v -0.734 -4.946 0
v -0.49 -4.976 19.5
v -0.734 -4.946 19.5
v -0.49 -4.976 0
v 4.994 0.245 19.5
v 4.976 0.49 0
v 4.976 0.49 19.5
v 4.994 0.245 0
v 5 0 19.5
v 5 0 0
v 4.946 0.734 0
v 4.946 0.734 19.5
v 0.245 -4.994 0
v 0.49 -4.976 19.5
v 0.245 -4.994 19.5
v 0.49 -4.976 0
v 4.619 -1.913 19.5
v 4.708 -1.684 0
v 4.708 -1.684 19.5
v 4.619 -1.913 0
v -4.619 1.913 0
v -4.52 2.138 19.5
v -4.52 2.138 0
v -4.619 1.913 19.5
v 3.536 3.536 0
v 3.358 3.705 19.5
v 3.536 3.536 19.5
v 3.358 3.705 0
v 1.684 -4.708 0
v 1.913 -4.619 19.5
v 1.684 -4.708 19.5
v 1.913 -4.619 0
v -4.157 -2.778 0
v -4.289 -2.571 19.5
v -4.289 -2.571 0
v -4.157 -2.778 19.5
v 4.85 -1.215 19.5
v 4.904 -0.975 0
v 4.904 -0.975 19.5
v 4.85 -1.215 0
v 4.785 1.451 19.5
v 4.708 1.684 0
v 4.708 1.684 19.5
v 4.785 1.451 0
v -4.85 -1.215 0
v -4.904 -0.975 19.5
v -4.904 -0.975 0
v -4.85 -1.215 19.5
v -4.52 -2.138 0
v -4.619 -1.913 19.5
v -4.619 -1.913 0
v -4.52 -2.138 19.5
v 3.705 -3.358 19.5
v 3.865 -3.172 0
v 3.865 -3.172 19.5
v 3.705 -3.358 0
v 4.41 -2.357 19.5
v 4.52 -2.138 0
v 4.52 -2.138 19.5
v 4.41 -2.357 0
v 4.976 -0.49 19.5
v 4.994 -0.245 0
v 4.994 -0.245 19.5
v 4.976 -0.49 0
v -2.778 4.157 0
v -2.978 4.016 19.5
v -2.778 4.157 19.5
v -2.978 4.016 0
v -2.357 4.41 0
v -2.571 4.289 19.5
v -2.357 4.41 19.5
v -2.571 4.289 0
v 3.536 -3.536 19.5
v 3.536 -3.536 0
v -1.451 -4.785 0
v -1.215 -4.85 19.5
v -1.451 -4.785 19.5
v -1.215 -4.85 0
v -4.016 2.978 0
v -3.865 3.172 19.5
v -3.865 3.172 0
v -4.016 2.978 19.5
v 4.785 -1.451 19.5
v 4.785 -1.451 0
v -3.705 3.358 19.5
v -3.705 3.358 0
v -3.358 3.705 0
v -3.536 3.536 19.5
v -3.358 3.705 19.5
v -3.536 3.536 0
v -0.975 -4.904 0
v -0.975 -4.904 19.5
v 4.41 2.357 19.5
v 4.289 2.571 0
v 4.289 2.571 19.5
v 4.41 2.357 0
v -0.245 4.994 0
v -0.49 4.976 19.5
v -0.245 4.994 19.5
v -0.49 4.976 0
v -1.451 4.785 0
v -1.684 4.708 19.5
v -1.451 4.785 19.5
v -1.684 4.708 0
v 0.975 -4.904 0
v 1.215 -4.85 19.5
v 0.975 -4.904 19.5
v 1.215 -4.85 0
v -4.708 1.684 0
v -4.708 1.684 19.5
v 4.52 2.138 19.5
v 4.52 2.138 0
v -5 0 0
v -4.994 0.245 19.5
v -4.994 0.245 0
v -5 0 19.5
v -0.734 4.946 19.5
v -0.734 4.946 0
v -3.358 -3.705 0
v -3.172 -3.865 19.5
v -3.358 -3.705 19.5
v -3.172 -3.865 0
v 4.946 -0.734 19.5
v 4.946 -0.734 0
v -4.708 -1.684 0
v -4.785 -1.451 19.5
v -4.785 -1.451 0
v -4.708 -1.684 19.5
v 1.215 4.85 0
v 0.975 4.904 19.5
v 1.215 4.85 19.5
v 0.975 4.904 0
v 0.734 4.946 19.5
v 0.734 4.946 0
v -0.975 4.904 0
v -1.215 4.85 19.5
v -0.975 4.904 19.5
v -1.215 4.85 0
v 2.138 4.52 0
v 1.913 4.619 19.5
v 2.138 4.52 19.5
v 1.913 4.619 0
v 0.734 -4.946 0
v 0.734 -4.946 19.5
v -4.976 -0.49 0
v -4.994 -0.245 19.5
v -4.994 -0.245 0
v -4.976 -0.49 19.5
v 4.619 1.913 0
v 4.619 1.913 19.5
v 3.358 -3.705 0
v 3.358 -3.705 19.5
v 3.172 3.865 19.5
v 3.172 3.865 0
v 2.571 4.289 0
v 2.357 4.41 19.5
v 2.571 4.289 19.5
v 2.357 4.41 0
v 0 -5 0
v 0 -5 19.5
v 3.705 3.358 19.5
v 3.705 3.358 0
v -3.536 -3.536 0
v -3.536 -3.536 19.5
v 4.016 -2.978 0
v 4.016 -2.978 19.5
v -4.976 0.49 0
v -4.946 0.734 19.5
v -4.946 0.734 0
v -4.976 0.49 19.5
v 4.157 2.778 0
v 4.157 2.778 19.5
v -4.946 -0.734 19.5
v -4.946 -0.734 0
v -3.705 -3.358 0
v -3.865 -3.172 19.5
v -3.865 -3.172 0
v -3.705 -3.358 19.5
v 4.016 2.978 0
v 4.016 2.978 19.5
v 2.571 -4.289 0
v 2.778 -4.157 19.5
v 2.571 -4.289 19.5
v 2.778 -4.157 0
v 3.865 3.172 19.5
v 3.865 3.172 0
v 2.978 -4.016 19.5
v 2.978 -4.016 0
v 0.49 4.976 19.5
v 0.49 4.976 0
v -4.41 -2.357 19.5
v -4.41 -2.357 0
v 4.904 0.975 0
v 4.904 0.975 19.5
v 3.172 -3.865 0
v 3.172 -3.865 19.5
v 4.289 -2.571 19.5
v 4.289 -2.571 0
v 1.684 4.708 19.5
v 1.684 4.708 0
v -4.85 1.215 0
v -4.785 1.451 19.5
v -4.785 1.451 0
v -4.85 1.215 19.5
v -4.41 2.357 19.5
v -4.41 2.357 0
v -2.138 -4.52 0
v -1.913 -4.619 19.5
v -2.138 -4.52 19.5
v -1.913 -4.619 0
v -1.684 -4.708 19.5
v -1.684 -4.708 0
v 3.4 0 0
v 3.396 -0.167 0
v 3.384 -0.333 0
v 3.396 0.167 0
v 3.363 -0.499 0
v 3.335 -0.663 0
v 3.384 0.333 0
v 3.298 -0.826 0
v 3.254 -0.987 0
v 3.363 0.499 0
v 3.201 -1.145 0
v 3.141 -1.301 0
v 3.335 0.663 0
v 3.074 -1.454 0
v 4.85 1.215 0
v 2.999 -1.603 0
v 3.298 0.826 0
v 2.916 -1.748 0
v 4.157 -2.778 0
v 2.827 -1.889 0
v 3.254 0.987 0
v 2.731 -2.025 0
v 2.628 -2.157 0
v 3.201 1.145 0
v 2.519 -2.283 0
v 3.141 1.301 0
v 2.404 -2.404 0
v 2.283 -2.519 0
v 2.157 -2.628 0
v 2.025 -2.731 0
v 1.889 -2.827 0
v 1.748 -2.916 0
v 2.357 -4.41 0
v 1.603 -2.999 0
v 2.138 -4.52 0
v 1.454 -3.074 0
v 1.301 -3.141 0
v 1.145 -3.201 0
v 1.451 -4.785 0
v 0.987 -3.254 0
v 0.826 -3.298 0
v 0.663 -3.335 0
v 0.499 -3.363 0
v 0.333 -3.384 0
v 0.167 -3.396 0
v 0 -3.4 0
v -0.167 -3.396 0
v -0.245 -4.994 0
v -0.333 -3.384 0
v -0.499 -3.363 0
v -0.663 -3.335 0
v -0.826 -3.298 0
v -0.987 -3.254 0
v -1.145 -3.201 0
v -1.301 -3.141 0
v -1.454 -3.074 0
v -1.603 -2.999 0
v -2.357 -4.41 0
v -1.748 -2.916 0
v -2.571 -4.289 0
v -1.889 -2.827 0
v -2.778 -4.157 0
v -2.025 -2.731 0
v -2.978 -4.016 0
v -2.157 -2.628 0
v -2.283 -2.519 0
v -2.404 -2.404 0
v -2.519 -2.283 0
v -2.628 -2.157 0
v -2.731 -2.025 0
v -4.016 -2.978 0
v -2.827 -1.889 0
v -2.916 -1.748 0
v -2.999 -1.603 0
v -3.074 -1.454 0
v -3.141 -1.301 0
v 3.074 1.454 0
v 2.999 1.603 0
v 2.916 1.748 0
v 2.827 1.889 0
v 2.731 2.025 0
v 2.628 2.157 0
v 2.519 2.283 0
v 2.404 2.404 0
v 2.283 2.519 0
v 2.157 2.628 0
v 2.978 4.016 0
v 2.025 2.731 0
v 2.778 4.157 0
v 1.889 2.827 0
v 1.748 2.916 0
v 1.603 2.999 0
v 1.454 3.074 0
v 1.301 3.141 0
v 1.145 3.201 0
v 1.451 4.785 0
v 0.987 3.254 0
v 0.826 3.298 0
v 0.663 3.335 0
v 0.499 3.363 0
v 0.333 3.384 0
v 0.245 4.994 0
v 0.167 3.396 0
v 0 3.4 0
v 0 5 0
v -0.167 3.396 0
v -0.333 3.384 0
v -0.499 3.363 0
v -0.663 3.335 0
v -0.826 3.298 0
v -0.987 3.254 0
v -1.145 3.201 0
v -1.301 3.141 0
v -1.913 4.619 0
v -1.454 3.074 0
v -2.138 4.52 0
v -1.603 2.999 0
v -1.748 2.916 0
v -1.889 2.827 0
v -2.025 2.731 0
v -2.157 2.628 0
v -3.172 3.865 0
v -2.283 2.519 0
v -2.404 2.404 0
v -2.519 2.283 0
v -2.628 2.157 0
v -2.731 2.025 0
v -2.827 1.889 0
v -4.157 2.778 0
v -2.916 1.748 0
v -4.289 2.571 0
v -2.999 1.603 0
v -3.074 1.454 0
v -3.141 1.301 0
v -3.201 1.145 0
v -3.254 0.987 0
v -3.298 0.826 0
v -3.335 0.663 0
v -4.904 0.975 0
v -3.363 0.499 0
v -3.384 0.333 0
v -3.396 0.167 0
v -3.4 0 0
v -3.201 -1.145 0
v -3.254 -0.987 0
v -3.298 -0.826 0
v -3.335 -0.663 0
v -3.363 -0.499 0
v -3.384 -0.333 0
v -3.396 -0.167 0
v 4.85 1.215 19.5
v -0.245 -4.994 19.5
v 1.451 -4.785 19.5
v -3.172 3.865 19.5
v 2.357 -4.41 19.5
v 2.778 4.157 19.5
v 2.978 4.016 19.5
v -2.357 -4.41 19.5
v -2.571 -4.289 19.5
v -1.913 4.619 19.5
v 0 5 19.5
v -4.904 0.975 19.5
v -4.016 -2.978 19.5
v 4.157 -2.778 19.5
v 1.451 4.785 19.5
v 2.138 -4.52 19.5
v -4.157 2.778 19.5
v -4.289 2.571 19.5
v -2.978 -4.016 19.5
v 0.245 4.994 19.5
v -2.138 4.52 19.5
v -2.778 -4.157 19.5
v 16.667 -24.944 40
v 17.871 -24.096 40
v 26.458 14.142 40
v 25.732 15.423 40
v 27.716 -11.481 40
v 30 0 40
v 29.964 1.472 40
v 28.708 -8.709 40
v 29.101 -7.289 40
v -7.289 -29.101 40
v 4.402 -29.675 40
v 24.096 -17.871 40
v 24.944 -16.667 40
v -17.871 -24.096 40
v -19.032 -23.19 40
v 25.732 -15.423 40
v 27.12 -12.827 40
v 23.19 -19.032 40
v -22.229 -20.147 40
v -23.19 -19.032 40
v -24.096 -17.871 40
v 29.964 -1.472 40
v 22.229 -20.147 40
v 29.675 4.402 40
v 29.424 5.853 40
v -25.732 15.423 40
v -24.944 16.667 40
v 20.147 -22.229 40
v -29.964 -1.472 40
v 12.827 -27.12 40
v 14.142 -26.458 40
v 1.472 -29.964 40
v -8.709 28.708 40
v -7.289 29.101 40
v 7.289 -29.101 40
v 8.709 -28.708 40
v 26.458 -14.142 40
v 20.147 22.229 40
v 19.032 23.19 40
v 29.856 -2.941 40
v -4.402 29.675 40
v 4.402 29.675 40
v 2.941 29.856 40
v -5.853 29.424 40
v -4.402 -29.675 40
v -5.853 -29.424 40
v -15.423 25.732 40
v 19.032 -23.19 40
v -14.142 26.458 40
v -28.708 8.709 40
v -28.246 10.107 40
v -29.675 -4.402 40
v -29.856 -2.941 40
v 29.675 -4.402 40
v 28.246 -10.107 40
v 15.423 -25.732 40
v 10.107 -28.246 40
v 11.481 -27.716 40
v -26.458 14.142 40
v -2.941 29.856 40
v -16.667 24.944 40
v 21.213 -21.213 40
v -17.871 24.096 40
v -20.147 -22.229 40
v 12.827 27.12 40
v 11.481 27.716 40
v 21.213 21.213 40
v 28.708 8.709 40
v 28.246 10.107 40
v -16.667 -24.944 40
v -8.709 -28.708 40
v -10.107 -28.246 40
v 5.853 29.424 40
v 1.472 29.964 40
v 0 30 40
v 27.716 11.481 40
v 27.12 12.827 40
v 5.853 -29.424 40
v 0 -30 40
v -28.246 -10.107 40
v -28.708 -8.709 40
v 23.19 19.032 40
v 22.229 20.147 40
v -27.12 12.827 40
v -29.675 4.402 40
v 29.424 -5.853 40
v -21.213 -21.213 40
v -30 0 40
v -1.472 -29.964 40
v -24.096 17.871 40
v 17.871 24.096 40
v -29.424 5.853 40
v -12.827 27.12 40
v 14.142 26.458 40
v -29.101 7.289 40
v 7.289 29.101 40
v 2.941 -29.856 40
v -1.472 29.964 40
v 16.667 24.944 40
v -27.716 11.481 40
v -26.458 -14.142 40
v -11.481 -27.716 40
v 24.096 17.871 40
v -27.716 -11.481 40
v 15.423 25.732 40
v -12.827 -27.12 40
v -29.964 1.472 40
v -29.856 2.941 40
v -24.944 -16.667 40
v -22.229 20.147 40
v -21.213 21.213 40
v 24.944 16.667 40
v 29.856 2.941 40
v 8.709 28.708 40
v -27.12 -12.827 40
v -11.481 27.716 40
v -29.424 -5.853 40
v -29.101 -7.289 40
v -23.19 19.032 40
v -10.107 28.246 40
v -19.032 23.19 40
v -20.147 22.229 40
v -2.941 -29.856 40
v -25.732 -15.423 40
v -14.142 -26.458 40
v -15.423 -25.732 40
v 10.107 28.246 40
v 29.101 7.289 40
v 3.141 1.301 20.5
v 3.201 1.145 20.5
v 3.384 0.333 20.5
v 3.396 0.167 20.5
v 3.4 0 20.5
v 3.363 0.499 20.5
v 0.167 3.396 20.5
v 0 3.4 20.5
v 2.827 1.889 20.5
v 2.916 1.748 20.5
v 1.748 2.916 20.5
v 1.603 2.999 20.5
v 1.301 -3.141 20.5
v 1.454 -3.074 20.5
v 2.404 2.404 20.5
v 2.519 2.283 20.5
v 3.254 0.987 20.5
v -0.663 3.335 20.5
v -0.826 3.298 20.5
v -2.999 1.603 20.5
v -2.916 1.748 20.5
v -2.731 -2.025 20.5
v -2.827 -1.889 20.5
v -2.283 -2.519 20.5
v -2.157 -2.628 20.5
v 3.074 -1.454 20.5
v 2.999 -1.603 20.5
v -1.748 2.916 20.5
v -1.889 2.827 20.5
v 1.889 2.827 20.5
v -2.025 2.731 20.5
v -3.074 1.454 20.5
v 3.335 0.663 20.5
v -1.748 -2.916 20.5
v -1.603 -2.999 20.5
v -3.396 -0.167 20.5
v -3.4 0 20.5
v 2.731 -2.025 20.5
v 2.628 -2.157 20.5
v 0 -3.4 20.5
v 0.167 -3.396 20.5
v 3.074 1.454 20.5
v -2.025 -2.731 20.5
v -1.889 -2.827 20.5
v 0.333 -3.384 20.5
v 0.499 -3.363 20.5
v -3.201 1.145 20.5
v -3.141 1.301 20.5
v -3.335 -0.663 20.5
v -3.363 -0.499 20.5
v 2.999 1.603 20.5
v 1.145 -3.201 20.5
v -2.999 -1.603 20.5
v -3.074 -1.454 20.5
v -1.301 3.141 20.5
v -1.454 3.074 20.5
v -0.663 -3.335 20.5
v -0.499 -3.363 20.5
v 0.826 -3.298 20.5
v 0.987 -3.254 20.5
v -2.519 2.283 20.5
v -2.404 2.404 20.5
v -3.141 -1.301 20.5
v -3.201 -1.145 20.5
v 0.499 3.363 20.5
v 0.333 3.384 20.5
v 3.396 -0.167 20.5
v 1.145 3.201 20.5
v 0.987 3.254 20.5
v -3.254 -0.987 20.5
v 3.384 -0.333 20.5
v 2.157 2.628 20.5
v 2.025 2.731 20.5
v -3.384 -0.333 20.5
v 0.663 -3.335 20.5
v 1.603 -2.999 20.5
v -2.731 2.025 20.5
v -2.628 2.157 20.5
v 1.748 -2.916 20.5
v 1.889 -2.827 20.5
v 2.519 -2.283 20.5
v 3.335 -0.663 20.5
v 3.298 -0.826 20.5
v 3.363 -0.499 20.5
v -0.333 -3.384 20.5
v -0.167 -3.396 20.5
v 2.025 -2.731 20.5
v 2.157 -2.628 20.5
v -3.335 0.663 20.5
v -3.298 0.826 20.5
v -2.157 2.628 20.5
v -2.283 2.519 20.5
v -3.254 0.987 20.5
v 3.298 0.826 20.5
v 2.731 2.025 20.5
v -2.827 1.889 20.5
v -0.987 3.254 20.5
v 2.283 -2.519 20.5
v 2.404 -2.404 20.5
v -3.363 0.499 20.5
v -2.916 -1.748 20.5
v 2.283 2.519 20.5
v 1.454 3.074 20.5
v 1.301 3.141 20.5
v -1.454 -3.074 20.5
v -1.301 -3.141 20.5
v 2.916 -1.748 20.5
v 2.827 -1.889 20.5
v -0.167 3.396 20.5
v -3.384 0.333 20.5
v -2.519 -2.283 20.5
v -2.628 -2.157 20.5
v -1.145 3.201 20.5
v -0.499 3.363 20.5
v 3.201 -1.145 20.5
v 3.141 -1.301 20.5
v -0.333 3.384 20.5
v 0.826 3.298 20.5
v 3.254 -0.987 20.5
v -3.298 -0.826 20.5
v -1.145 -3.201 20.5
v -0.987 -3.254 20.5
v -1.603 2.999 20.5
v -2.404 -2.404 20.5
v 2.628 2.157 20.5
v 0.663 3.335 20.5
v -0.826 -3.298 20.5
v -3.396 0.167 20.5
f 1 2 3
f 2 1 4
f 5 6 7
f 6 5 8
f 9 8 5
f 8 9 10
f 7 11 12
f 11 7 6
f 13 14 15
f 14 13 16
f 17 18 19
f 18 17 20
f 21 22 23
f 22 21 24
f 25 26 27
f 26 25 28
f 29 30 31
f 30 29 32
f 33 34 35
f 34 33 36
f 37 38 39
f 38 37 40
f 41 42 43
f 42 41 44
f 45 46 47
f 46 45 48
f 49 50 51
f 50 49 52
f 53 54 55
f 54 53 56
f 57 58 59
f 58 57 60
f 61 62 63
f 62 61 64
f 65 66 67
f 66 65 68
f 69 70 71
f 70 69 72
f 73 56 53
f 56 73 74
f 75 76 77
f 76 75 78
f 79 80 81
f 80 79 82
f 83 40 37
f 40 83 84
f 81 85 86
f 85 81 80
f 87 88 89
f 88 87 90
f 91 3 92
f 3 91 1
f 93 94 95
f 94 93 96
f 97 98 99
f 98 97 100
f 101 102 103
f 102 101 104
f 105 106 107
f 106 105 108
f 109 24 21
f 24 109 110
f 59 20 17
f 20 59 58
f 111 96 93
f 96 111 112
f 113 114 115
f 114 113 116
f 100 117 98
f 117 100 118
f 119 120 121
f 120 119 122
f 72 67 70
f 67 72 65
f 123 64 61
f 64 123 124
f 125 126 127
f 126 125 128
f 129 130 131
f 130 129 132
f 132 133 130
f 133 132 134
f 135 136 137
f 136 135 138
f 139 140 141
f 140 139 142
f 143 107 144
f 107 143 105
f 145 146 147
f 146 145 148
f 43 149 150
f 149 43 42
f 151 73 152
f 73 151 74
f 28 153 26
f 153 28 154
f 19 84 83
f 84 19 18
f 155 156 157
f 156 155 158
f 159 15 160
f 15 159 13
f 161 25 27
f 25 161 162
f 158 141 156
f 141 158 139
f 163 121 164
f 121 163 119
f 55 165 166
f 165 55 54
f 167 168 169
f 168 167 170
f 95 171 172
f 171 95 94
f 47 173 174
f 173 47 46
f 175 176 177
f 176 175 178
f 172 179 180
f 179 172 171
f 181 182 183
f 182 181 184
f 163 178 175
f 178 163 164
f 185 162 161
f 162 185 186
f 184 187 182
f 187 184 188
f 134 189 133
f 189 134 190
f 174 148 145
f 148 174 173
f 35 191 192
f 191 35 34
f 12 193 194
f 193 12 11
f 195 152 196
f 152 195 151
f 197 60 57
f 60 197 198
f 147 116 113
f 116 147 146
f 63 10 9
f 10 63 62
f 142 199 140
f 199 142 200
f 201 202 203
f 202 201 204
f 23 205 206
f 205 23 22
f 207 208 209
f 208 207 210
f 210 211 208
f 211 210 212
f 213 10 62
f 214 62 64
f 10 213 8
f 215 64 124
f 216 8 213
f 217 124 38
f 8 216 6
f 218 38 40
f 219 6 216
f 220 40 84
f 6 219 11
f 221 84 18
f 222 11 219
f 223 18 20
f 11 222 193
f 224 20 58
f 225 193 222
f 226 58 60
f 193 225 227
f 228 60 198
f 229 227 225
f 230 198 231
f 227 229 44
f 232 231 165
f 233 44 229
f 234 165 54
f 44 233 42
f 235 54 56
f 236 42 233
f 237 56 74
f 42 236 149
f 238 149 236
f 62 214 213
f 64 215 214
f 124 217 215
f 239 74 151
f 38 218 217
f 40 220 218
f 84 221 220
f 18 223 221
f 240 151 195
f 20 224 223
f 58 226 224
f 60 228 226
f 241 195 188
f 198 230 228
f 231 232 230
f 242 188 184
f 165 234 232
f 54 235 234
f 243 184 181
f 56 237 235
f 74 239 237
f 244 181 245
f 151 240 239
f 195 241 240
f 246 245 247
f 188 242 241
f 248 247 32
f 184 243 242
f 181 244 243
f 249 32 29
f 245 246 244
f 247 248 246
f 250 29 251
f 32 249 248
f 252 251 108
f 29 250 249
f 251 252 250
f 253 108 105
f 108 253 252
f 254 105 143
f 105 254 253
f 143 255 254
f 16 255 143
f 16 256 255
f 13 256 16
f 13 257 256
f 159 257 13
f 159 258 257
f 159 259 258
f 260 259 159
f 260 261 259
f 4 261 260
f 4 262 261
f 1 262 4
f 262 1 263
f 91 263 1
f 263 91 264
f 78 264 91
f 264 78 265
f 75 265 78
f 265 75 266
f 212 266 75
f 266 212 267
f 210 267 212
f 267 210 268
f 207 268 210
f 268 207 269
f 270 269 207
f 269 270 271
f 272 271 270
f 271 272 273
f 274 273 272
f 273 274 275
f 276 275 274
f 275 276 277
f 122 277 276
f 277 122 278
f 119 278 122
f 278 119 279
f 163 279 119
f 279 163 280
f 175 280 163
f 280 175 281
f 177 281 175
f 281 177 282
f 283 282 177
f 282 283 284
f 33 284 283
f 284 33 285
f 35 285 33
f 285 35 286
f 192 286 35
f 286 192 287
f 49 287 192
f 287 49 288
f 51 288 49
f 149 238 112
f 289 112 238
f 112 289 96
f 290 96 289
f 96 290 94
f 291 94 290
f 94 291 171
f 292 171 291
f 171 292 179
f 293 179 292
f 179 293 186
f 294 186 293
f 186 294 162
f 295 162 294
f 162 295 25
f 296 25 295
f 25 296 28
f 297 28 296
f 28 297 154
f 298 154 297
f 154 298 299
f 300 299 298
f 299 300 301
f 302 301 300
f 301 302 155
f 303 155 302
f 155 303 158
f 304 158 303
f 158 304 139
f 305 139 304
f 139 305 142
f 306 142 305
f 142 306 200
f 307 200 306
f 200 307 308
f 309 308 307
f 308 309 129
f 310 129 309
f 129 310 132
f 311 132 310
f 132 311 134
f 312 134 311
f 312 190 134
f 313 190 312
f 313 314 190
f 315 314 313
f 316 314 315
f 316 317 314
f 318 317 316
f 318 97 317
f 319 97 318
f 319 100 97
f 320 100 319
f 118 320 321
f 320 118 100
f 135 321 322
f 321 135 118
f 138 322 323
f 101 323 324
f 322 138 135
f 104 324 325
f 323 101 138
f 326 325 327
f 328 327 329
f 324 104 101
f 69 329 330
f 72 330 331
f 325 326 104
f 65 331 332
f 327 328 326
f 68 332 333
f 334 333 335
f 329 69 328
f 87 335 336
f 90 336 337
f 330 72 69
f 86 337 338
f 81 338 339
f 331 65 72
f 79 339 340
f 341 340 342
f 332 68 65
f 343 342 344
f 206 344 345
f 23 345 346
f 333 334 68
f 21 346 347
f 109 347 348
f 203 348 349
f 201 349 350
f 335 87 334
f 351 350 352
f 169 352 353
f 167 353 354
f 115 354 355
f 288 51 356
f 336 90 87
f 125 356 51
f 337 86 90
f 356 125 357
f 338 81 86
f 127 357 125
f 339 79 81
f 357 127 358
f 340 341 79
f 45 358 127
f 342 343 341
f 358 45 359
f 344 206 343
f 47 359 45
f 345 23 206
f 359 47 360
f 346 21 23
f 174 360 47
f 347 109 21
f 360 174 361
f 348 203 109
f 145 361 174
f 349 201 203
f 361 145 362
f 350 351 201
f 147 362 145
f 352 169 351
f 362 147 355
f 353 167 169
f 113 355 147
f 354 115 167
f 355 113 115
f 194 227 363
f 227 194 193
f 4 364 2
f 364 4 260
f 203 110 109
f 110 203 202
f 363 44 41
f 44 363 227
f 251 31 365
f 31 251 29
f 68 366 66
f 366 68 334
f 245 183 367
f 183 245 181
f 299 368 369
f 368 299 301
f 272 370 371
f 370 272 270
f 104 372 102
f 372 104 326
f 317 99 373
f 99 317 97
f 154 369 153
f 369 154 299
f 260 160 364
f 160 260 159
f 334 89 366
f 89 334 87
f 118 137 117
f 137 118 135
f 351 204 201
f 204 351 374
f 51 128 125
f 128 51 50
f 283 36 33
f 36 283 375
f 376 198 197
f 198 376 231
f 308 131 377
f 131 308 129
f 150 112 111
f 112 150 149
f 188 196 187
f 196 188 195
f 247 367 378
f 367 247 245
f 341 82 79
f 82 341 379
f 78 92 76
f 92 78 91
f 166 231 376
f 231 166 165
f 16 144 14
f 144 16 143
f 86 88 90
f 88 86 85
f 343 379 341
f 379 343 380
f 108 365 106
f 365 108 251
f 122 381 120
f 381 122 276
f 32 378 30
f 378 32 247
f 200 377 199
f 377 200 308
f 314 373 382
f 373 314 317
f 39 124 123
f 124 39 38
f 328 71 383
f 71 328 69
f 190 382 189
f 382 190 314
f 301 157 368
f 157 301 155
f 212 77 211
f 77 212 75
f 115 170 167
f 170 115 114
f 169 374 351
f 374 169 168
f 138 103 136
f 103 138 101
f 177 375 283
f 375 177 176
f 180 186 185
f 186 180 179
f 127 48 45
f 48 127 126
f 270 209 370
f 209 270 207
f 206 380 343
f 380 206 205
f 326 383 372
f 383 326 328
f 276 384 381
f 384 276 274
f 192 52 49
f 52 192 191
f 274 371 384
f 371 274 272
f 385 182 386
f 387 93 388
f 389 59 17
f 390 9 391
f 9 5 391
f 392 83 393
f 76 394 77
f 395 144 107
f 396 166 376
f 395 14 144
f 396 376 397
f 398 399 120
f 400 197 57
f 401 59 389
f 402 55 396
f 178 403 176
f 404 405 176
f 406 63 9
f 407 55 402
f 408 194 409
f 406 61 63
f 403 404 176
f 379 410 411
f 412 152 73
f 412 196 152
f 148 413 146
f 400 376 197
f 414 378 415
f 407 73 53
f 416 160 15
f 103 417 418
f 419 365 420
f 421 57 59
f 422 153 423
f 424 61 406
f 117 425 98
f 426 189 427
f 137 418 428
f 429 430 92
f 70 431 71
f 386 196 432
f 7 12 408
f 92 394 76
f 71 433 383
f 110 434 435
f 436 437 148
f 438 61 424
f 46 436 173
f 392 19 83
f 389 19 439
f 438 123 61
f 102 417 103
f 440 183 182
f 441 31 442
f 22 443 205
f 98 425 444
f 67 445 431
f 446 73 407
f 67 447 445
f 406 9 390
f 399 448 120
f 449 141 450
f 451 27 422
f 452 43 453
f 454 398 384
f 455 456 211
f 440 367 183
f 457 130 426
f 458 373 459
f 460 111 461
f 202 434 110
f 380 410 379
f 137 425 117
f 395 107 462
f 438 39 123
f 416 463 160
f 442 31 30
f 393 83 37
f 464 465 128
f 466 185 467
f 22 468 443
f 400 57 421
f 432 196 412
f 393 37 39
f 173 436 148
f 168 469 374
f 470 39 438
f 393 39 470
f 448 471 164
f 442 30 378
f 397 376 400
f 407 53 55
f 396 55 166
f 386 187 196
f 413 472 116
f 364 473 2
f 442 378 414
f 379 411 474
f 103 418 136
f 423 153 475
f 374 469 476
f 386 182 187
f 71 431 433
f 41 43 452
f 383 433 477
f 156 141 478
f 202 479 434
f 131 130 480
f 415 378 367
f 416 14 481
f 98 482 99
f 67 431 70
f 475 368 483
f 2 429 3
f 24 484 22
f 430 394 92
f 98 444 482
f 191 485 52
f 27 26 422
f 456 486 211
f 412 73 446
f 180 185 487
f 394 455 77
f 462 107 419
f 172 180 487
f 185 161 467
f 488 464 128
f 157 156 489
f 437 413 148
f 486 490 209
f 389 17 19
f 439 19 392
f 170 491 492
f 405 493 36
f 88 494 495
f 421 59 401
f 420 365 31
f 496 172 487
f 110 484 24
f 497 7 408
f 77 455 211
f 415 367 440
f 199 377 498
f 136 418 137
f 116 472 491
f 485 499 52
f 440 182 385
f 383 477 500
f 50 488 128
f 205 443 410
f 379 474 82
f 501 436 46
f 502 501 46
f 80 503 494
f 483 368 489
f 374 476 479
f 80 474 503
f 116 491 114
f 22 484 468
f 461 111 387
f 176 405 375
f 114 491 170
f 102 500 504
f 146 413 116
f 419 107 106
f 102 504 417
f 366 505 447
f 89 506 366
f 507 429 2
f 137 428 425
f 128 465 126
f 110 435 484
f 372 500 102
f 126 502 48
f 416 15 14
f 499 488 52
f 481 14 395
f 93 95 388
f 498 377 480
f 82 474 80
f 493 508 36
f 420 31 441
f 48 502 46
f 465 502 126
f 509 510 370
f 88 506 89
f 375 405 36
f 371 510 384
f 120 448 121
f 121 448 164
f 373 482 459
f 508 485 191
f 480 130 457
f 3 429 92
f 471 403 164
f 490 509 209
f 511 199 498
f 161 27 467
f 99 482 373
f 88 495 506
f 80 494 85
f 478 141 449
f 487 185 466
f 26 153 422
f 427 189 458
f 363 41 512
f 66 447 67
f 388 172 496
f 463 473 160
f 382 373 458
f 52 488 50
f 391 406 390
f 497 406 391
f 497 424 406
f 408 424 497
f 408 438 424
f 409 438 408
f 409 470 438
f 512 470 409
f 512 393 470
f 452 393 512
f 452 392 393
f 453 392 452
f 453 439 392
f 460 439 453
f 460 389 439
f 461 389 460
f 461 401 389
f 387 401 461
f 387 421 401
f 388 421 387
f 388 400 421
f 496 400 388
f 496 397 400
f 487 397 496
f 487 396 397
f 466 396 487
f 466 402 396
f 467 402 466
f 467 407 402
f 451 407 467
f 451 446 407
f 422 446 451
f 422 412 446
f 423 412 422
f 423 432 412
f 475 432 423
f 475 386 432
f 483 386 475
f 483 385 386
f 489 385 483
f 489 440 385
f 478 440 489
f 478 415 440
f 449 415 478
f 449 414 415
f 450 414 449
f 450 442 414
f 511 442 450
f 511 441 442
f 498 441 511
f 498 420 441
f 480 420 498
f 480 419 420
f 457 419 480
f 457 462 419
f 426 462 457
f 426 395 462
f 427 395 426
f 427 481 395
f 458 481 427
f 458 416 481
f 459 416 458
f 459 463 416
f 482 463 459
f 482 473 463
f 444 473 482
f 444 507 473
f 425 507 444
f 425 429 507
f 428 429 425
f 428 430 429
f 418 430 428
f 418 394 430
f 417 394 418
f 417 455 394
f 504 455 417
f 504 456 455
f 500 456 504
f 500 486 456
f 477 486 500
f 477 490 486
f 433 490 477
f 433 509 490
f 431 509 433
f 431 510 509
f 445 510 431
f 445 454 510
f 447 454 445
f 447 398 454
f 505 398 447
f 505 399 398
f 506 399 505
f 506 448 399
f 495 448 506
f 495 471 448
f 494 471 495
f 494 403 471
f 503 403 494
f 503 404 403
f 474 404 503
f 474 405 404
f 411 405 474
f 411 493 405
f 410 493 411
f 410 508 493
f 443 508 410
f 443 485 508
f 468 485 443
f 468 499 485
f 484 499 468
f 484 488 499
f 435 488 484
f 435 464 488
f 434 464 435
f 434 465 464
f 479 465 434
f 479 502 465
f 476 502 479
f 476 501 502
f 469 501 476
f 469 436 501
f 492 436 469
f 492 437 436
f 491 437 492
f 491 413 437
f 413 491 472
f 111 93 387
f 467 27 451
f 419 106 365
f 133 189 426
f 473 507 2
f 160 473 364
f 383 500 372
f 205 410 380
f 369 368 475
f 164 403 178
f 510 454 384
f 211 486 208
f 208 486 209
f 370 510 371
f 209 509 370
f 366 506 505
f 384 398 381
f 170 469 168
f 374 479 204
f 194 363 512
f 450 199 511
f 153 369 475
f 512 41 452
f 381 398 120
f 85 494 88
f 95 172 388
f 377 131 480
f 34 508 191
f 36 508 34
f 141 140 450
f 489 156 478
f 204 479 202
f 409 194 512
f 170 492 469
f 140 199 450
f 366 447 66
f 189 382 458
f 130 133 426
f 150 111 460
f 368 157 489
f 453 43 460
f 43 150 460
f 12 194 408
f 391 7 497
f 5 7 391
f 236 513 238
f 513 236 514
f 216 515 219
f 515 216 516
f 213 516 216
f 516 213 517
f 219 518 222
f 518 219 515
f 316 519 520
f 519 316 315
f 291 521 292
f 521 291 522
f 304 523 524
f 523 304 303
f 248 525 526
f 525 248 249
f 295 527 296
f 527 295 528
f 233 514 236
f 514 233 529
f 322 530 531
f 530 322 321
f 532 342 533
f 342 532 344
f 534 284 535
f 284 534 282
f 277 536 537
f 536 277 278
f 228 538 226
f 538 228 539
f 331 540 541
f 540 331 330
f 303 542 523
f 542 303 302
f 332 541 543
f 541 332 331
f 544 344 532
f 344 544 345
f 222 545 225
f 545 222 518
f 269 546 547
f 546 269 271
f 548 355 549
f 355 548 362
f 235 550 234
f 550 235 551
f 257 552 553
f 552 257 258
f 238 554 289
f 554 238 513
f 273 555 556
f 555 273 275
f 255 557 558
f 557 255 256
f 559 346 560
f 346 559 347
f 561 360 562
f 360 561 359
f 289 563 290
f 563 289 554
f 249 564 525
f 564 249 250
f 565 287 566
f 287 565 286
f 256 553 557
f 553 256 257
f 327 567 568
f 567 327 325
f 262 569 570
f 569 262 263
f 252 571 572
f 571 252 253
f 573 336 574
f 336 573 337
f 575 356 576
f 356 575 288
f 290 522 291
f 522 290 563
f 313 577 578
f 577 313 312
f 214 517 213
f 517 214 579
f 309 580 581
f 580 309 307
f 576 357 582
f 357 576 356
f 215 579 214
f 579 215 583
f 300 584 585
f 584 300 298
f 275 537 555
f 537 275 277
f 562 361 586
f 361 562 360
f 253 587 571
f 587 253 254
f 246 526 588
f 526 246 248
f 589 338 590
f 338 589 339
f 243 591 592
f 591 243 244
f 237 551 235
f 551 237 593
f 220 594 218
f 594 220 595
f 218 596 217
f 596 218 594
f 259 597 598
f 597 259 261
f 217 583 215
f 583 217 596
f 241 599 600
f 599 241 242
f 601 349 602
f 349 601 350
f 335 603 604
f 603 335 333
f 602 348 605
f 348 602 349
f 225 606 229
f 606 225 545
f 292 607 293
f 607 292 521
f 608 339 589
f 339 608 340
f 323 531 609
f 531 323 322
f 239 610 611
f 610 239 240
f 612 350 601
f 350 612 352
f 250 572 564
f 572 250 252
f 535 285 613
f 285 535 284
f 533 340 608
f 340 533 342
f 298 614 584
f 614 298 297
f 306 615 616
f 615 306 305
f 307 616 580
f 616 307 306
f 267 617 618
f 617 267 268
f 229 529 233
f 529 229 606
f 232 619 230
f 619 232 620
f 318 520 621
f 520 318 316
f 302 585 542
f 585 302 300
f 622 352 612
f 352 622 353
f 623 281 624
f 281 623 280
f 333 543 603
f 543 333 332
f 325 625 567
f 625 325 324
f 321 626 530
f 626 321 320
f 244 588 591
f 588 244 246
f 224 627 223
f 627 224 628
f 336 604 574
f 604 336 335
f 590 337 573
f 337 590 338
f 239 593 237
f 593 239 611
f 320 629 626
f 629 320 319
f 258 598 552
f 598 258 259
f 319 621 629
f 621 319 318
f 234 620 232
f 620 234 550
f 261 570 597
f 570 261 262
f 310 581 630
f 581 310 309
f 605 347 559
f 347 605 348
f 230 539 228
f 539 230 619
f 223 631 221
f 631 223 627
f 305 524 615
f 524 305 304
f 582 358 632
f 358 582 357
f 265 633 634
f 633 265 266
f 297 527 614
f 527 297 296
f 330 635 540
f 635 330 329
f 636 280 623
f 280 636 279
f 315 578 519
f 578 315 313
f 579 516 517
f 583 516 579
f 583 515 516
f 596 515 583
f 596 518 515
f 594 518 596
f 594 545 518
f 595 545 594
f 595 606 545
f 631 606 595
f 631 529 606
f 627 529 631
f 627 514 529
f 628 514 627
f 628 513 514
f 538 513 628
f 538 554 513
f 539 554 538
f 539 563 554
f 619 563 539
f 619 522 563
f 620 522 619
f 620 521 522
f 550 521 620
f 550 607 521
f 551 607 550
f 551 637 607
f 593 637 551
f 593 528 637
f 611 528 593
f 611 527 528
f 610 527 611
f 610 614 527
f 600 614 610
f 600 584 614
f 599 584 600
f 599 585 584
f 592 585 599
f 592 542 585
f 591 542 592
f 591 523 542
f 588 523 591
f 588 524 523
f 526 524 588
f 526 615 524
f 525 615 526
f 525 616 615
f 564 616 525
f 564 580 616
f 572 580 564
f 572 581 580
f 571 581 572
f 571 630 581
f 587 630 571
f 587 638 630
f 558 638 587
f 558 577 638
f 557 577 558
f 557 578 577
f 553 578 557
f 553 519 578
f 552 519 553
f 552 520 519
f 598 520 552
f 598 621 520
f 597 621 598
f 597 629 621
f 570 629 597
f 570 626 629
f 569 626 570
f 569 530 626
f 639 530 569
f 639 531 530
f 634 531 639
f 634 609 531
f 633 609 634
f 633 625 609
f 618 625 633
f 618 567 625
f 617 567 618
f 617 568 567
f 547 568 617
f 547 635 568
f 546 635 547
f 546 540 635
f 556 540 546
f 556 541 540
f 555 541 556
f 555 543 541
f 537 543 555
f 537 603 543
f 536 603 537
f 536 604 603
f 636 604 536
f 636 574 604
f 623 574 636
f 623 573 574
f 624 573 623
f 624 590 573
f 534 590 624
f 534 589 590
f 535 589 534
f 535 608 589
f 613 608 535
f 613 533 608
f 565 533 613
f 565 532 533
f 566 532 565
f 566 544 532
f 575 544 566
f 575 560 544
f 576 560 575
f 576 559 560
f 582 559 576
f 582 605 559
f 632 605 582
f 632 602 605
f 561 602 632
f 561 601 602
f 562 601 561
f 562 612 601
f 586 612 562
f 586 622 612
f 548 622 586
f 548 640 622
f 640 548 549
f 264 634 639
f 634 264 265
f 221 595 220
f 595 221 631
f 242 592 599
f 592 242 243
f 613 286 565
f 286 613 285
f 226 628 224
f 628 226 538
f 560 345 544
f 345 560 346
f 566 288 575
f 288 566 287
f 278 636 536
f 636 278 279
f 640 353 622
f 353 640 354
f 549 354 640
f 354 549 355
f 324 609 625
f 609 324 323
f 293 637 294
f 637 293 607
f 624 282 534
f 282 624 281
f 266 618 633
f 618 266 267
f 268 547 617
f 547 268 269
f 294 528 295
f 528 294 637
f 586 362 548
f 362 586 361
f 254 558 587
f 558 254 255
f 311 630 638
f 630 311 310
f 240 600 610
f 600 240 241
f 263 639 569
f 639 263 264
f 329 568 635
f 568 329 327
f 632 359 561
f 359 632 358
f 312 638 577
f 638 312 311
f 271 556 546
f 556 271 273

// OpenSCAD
// Small lab funnel, printed upright with the wide opening at the top
// Units: mm

$fn = 128;

// ---- Spout (tube) ----
spout_od      = 10;    // outer diameter of spout
spout_h       = 20;    // spout height (z = 0 to z = 20)
spout_wall    = 1.6;   // spout wall thickness
spout_bore    = spout_od - 2 * spout_wall; // bore = 6.8 mm

// ---- Cone ----
cone_bottom_d = spout_od;          // cone starts at spout outer diameter
cone_top_d    = 60;                // cone rim diameter
cone_h        = spout_h;           // cone height (z = 20 to z = 50)
cone_wall     = 1.6;               // cone wall thickness

// ---- Joinery ----
eps           = 0.5;               // overlap so no coplanar faces
merge         = min(eps, spout_wall, cone_wall); // keep walls thick at the join

difference() {
    union() {
        // Spout
        cylinder(d = spout_od, h = spout_h + merge);

        // Cone, slightly extended upward so the rim is exactly at z = 50
        translate([0, 0, spout_h - merge])
            cylinder(d1 = cone_bottom_d,
                     d2 = cone_top_d,
                     h  = cone_h + merge);
    }

    // Through-bore from the bottom opening up into the cone
    // (liquid runs straight through; bore continues past the bottom rim)
    translate([0, 0, -eps])
        cylinder(d = spout_bore, h = cone_h + 2 * eps);
}
